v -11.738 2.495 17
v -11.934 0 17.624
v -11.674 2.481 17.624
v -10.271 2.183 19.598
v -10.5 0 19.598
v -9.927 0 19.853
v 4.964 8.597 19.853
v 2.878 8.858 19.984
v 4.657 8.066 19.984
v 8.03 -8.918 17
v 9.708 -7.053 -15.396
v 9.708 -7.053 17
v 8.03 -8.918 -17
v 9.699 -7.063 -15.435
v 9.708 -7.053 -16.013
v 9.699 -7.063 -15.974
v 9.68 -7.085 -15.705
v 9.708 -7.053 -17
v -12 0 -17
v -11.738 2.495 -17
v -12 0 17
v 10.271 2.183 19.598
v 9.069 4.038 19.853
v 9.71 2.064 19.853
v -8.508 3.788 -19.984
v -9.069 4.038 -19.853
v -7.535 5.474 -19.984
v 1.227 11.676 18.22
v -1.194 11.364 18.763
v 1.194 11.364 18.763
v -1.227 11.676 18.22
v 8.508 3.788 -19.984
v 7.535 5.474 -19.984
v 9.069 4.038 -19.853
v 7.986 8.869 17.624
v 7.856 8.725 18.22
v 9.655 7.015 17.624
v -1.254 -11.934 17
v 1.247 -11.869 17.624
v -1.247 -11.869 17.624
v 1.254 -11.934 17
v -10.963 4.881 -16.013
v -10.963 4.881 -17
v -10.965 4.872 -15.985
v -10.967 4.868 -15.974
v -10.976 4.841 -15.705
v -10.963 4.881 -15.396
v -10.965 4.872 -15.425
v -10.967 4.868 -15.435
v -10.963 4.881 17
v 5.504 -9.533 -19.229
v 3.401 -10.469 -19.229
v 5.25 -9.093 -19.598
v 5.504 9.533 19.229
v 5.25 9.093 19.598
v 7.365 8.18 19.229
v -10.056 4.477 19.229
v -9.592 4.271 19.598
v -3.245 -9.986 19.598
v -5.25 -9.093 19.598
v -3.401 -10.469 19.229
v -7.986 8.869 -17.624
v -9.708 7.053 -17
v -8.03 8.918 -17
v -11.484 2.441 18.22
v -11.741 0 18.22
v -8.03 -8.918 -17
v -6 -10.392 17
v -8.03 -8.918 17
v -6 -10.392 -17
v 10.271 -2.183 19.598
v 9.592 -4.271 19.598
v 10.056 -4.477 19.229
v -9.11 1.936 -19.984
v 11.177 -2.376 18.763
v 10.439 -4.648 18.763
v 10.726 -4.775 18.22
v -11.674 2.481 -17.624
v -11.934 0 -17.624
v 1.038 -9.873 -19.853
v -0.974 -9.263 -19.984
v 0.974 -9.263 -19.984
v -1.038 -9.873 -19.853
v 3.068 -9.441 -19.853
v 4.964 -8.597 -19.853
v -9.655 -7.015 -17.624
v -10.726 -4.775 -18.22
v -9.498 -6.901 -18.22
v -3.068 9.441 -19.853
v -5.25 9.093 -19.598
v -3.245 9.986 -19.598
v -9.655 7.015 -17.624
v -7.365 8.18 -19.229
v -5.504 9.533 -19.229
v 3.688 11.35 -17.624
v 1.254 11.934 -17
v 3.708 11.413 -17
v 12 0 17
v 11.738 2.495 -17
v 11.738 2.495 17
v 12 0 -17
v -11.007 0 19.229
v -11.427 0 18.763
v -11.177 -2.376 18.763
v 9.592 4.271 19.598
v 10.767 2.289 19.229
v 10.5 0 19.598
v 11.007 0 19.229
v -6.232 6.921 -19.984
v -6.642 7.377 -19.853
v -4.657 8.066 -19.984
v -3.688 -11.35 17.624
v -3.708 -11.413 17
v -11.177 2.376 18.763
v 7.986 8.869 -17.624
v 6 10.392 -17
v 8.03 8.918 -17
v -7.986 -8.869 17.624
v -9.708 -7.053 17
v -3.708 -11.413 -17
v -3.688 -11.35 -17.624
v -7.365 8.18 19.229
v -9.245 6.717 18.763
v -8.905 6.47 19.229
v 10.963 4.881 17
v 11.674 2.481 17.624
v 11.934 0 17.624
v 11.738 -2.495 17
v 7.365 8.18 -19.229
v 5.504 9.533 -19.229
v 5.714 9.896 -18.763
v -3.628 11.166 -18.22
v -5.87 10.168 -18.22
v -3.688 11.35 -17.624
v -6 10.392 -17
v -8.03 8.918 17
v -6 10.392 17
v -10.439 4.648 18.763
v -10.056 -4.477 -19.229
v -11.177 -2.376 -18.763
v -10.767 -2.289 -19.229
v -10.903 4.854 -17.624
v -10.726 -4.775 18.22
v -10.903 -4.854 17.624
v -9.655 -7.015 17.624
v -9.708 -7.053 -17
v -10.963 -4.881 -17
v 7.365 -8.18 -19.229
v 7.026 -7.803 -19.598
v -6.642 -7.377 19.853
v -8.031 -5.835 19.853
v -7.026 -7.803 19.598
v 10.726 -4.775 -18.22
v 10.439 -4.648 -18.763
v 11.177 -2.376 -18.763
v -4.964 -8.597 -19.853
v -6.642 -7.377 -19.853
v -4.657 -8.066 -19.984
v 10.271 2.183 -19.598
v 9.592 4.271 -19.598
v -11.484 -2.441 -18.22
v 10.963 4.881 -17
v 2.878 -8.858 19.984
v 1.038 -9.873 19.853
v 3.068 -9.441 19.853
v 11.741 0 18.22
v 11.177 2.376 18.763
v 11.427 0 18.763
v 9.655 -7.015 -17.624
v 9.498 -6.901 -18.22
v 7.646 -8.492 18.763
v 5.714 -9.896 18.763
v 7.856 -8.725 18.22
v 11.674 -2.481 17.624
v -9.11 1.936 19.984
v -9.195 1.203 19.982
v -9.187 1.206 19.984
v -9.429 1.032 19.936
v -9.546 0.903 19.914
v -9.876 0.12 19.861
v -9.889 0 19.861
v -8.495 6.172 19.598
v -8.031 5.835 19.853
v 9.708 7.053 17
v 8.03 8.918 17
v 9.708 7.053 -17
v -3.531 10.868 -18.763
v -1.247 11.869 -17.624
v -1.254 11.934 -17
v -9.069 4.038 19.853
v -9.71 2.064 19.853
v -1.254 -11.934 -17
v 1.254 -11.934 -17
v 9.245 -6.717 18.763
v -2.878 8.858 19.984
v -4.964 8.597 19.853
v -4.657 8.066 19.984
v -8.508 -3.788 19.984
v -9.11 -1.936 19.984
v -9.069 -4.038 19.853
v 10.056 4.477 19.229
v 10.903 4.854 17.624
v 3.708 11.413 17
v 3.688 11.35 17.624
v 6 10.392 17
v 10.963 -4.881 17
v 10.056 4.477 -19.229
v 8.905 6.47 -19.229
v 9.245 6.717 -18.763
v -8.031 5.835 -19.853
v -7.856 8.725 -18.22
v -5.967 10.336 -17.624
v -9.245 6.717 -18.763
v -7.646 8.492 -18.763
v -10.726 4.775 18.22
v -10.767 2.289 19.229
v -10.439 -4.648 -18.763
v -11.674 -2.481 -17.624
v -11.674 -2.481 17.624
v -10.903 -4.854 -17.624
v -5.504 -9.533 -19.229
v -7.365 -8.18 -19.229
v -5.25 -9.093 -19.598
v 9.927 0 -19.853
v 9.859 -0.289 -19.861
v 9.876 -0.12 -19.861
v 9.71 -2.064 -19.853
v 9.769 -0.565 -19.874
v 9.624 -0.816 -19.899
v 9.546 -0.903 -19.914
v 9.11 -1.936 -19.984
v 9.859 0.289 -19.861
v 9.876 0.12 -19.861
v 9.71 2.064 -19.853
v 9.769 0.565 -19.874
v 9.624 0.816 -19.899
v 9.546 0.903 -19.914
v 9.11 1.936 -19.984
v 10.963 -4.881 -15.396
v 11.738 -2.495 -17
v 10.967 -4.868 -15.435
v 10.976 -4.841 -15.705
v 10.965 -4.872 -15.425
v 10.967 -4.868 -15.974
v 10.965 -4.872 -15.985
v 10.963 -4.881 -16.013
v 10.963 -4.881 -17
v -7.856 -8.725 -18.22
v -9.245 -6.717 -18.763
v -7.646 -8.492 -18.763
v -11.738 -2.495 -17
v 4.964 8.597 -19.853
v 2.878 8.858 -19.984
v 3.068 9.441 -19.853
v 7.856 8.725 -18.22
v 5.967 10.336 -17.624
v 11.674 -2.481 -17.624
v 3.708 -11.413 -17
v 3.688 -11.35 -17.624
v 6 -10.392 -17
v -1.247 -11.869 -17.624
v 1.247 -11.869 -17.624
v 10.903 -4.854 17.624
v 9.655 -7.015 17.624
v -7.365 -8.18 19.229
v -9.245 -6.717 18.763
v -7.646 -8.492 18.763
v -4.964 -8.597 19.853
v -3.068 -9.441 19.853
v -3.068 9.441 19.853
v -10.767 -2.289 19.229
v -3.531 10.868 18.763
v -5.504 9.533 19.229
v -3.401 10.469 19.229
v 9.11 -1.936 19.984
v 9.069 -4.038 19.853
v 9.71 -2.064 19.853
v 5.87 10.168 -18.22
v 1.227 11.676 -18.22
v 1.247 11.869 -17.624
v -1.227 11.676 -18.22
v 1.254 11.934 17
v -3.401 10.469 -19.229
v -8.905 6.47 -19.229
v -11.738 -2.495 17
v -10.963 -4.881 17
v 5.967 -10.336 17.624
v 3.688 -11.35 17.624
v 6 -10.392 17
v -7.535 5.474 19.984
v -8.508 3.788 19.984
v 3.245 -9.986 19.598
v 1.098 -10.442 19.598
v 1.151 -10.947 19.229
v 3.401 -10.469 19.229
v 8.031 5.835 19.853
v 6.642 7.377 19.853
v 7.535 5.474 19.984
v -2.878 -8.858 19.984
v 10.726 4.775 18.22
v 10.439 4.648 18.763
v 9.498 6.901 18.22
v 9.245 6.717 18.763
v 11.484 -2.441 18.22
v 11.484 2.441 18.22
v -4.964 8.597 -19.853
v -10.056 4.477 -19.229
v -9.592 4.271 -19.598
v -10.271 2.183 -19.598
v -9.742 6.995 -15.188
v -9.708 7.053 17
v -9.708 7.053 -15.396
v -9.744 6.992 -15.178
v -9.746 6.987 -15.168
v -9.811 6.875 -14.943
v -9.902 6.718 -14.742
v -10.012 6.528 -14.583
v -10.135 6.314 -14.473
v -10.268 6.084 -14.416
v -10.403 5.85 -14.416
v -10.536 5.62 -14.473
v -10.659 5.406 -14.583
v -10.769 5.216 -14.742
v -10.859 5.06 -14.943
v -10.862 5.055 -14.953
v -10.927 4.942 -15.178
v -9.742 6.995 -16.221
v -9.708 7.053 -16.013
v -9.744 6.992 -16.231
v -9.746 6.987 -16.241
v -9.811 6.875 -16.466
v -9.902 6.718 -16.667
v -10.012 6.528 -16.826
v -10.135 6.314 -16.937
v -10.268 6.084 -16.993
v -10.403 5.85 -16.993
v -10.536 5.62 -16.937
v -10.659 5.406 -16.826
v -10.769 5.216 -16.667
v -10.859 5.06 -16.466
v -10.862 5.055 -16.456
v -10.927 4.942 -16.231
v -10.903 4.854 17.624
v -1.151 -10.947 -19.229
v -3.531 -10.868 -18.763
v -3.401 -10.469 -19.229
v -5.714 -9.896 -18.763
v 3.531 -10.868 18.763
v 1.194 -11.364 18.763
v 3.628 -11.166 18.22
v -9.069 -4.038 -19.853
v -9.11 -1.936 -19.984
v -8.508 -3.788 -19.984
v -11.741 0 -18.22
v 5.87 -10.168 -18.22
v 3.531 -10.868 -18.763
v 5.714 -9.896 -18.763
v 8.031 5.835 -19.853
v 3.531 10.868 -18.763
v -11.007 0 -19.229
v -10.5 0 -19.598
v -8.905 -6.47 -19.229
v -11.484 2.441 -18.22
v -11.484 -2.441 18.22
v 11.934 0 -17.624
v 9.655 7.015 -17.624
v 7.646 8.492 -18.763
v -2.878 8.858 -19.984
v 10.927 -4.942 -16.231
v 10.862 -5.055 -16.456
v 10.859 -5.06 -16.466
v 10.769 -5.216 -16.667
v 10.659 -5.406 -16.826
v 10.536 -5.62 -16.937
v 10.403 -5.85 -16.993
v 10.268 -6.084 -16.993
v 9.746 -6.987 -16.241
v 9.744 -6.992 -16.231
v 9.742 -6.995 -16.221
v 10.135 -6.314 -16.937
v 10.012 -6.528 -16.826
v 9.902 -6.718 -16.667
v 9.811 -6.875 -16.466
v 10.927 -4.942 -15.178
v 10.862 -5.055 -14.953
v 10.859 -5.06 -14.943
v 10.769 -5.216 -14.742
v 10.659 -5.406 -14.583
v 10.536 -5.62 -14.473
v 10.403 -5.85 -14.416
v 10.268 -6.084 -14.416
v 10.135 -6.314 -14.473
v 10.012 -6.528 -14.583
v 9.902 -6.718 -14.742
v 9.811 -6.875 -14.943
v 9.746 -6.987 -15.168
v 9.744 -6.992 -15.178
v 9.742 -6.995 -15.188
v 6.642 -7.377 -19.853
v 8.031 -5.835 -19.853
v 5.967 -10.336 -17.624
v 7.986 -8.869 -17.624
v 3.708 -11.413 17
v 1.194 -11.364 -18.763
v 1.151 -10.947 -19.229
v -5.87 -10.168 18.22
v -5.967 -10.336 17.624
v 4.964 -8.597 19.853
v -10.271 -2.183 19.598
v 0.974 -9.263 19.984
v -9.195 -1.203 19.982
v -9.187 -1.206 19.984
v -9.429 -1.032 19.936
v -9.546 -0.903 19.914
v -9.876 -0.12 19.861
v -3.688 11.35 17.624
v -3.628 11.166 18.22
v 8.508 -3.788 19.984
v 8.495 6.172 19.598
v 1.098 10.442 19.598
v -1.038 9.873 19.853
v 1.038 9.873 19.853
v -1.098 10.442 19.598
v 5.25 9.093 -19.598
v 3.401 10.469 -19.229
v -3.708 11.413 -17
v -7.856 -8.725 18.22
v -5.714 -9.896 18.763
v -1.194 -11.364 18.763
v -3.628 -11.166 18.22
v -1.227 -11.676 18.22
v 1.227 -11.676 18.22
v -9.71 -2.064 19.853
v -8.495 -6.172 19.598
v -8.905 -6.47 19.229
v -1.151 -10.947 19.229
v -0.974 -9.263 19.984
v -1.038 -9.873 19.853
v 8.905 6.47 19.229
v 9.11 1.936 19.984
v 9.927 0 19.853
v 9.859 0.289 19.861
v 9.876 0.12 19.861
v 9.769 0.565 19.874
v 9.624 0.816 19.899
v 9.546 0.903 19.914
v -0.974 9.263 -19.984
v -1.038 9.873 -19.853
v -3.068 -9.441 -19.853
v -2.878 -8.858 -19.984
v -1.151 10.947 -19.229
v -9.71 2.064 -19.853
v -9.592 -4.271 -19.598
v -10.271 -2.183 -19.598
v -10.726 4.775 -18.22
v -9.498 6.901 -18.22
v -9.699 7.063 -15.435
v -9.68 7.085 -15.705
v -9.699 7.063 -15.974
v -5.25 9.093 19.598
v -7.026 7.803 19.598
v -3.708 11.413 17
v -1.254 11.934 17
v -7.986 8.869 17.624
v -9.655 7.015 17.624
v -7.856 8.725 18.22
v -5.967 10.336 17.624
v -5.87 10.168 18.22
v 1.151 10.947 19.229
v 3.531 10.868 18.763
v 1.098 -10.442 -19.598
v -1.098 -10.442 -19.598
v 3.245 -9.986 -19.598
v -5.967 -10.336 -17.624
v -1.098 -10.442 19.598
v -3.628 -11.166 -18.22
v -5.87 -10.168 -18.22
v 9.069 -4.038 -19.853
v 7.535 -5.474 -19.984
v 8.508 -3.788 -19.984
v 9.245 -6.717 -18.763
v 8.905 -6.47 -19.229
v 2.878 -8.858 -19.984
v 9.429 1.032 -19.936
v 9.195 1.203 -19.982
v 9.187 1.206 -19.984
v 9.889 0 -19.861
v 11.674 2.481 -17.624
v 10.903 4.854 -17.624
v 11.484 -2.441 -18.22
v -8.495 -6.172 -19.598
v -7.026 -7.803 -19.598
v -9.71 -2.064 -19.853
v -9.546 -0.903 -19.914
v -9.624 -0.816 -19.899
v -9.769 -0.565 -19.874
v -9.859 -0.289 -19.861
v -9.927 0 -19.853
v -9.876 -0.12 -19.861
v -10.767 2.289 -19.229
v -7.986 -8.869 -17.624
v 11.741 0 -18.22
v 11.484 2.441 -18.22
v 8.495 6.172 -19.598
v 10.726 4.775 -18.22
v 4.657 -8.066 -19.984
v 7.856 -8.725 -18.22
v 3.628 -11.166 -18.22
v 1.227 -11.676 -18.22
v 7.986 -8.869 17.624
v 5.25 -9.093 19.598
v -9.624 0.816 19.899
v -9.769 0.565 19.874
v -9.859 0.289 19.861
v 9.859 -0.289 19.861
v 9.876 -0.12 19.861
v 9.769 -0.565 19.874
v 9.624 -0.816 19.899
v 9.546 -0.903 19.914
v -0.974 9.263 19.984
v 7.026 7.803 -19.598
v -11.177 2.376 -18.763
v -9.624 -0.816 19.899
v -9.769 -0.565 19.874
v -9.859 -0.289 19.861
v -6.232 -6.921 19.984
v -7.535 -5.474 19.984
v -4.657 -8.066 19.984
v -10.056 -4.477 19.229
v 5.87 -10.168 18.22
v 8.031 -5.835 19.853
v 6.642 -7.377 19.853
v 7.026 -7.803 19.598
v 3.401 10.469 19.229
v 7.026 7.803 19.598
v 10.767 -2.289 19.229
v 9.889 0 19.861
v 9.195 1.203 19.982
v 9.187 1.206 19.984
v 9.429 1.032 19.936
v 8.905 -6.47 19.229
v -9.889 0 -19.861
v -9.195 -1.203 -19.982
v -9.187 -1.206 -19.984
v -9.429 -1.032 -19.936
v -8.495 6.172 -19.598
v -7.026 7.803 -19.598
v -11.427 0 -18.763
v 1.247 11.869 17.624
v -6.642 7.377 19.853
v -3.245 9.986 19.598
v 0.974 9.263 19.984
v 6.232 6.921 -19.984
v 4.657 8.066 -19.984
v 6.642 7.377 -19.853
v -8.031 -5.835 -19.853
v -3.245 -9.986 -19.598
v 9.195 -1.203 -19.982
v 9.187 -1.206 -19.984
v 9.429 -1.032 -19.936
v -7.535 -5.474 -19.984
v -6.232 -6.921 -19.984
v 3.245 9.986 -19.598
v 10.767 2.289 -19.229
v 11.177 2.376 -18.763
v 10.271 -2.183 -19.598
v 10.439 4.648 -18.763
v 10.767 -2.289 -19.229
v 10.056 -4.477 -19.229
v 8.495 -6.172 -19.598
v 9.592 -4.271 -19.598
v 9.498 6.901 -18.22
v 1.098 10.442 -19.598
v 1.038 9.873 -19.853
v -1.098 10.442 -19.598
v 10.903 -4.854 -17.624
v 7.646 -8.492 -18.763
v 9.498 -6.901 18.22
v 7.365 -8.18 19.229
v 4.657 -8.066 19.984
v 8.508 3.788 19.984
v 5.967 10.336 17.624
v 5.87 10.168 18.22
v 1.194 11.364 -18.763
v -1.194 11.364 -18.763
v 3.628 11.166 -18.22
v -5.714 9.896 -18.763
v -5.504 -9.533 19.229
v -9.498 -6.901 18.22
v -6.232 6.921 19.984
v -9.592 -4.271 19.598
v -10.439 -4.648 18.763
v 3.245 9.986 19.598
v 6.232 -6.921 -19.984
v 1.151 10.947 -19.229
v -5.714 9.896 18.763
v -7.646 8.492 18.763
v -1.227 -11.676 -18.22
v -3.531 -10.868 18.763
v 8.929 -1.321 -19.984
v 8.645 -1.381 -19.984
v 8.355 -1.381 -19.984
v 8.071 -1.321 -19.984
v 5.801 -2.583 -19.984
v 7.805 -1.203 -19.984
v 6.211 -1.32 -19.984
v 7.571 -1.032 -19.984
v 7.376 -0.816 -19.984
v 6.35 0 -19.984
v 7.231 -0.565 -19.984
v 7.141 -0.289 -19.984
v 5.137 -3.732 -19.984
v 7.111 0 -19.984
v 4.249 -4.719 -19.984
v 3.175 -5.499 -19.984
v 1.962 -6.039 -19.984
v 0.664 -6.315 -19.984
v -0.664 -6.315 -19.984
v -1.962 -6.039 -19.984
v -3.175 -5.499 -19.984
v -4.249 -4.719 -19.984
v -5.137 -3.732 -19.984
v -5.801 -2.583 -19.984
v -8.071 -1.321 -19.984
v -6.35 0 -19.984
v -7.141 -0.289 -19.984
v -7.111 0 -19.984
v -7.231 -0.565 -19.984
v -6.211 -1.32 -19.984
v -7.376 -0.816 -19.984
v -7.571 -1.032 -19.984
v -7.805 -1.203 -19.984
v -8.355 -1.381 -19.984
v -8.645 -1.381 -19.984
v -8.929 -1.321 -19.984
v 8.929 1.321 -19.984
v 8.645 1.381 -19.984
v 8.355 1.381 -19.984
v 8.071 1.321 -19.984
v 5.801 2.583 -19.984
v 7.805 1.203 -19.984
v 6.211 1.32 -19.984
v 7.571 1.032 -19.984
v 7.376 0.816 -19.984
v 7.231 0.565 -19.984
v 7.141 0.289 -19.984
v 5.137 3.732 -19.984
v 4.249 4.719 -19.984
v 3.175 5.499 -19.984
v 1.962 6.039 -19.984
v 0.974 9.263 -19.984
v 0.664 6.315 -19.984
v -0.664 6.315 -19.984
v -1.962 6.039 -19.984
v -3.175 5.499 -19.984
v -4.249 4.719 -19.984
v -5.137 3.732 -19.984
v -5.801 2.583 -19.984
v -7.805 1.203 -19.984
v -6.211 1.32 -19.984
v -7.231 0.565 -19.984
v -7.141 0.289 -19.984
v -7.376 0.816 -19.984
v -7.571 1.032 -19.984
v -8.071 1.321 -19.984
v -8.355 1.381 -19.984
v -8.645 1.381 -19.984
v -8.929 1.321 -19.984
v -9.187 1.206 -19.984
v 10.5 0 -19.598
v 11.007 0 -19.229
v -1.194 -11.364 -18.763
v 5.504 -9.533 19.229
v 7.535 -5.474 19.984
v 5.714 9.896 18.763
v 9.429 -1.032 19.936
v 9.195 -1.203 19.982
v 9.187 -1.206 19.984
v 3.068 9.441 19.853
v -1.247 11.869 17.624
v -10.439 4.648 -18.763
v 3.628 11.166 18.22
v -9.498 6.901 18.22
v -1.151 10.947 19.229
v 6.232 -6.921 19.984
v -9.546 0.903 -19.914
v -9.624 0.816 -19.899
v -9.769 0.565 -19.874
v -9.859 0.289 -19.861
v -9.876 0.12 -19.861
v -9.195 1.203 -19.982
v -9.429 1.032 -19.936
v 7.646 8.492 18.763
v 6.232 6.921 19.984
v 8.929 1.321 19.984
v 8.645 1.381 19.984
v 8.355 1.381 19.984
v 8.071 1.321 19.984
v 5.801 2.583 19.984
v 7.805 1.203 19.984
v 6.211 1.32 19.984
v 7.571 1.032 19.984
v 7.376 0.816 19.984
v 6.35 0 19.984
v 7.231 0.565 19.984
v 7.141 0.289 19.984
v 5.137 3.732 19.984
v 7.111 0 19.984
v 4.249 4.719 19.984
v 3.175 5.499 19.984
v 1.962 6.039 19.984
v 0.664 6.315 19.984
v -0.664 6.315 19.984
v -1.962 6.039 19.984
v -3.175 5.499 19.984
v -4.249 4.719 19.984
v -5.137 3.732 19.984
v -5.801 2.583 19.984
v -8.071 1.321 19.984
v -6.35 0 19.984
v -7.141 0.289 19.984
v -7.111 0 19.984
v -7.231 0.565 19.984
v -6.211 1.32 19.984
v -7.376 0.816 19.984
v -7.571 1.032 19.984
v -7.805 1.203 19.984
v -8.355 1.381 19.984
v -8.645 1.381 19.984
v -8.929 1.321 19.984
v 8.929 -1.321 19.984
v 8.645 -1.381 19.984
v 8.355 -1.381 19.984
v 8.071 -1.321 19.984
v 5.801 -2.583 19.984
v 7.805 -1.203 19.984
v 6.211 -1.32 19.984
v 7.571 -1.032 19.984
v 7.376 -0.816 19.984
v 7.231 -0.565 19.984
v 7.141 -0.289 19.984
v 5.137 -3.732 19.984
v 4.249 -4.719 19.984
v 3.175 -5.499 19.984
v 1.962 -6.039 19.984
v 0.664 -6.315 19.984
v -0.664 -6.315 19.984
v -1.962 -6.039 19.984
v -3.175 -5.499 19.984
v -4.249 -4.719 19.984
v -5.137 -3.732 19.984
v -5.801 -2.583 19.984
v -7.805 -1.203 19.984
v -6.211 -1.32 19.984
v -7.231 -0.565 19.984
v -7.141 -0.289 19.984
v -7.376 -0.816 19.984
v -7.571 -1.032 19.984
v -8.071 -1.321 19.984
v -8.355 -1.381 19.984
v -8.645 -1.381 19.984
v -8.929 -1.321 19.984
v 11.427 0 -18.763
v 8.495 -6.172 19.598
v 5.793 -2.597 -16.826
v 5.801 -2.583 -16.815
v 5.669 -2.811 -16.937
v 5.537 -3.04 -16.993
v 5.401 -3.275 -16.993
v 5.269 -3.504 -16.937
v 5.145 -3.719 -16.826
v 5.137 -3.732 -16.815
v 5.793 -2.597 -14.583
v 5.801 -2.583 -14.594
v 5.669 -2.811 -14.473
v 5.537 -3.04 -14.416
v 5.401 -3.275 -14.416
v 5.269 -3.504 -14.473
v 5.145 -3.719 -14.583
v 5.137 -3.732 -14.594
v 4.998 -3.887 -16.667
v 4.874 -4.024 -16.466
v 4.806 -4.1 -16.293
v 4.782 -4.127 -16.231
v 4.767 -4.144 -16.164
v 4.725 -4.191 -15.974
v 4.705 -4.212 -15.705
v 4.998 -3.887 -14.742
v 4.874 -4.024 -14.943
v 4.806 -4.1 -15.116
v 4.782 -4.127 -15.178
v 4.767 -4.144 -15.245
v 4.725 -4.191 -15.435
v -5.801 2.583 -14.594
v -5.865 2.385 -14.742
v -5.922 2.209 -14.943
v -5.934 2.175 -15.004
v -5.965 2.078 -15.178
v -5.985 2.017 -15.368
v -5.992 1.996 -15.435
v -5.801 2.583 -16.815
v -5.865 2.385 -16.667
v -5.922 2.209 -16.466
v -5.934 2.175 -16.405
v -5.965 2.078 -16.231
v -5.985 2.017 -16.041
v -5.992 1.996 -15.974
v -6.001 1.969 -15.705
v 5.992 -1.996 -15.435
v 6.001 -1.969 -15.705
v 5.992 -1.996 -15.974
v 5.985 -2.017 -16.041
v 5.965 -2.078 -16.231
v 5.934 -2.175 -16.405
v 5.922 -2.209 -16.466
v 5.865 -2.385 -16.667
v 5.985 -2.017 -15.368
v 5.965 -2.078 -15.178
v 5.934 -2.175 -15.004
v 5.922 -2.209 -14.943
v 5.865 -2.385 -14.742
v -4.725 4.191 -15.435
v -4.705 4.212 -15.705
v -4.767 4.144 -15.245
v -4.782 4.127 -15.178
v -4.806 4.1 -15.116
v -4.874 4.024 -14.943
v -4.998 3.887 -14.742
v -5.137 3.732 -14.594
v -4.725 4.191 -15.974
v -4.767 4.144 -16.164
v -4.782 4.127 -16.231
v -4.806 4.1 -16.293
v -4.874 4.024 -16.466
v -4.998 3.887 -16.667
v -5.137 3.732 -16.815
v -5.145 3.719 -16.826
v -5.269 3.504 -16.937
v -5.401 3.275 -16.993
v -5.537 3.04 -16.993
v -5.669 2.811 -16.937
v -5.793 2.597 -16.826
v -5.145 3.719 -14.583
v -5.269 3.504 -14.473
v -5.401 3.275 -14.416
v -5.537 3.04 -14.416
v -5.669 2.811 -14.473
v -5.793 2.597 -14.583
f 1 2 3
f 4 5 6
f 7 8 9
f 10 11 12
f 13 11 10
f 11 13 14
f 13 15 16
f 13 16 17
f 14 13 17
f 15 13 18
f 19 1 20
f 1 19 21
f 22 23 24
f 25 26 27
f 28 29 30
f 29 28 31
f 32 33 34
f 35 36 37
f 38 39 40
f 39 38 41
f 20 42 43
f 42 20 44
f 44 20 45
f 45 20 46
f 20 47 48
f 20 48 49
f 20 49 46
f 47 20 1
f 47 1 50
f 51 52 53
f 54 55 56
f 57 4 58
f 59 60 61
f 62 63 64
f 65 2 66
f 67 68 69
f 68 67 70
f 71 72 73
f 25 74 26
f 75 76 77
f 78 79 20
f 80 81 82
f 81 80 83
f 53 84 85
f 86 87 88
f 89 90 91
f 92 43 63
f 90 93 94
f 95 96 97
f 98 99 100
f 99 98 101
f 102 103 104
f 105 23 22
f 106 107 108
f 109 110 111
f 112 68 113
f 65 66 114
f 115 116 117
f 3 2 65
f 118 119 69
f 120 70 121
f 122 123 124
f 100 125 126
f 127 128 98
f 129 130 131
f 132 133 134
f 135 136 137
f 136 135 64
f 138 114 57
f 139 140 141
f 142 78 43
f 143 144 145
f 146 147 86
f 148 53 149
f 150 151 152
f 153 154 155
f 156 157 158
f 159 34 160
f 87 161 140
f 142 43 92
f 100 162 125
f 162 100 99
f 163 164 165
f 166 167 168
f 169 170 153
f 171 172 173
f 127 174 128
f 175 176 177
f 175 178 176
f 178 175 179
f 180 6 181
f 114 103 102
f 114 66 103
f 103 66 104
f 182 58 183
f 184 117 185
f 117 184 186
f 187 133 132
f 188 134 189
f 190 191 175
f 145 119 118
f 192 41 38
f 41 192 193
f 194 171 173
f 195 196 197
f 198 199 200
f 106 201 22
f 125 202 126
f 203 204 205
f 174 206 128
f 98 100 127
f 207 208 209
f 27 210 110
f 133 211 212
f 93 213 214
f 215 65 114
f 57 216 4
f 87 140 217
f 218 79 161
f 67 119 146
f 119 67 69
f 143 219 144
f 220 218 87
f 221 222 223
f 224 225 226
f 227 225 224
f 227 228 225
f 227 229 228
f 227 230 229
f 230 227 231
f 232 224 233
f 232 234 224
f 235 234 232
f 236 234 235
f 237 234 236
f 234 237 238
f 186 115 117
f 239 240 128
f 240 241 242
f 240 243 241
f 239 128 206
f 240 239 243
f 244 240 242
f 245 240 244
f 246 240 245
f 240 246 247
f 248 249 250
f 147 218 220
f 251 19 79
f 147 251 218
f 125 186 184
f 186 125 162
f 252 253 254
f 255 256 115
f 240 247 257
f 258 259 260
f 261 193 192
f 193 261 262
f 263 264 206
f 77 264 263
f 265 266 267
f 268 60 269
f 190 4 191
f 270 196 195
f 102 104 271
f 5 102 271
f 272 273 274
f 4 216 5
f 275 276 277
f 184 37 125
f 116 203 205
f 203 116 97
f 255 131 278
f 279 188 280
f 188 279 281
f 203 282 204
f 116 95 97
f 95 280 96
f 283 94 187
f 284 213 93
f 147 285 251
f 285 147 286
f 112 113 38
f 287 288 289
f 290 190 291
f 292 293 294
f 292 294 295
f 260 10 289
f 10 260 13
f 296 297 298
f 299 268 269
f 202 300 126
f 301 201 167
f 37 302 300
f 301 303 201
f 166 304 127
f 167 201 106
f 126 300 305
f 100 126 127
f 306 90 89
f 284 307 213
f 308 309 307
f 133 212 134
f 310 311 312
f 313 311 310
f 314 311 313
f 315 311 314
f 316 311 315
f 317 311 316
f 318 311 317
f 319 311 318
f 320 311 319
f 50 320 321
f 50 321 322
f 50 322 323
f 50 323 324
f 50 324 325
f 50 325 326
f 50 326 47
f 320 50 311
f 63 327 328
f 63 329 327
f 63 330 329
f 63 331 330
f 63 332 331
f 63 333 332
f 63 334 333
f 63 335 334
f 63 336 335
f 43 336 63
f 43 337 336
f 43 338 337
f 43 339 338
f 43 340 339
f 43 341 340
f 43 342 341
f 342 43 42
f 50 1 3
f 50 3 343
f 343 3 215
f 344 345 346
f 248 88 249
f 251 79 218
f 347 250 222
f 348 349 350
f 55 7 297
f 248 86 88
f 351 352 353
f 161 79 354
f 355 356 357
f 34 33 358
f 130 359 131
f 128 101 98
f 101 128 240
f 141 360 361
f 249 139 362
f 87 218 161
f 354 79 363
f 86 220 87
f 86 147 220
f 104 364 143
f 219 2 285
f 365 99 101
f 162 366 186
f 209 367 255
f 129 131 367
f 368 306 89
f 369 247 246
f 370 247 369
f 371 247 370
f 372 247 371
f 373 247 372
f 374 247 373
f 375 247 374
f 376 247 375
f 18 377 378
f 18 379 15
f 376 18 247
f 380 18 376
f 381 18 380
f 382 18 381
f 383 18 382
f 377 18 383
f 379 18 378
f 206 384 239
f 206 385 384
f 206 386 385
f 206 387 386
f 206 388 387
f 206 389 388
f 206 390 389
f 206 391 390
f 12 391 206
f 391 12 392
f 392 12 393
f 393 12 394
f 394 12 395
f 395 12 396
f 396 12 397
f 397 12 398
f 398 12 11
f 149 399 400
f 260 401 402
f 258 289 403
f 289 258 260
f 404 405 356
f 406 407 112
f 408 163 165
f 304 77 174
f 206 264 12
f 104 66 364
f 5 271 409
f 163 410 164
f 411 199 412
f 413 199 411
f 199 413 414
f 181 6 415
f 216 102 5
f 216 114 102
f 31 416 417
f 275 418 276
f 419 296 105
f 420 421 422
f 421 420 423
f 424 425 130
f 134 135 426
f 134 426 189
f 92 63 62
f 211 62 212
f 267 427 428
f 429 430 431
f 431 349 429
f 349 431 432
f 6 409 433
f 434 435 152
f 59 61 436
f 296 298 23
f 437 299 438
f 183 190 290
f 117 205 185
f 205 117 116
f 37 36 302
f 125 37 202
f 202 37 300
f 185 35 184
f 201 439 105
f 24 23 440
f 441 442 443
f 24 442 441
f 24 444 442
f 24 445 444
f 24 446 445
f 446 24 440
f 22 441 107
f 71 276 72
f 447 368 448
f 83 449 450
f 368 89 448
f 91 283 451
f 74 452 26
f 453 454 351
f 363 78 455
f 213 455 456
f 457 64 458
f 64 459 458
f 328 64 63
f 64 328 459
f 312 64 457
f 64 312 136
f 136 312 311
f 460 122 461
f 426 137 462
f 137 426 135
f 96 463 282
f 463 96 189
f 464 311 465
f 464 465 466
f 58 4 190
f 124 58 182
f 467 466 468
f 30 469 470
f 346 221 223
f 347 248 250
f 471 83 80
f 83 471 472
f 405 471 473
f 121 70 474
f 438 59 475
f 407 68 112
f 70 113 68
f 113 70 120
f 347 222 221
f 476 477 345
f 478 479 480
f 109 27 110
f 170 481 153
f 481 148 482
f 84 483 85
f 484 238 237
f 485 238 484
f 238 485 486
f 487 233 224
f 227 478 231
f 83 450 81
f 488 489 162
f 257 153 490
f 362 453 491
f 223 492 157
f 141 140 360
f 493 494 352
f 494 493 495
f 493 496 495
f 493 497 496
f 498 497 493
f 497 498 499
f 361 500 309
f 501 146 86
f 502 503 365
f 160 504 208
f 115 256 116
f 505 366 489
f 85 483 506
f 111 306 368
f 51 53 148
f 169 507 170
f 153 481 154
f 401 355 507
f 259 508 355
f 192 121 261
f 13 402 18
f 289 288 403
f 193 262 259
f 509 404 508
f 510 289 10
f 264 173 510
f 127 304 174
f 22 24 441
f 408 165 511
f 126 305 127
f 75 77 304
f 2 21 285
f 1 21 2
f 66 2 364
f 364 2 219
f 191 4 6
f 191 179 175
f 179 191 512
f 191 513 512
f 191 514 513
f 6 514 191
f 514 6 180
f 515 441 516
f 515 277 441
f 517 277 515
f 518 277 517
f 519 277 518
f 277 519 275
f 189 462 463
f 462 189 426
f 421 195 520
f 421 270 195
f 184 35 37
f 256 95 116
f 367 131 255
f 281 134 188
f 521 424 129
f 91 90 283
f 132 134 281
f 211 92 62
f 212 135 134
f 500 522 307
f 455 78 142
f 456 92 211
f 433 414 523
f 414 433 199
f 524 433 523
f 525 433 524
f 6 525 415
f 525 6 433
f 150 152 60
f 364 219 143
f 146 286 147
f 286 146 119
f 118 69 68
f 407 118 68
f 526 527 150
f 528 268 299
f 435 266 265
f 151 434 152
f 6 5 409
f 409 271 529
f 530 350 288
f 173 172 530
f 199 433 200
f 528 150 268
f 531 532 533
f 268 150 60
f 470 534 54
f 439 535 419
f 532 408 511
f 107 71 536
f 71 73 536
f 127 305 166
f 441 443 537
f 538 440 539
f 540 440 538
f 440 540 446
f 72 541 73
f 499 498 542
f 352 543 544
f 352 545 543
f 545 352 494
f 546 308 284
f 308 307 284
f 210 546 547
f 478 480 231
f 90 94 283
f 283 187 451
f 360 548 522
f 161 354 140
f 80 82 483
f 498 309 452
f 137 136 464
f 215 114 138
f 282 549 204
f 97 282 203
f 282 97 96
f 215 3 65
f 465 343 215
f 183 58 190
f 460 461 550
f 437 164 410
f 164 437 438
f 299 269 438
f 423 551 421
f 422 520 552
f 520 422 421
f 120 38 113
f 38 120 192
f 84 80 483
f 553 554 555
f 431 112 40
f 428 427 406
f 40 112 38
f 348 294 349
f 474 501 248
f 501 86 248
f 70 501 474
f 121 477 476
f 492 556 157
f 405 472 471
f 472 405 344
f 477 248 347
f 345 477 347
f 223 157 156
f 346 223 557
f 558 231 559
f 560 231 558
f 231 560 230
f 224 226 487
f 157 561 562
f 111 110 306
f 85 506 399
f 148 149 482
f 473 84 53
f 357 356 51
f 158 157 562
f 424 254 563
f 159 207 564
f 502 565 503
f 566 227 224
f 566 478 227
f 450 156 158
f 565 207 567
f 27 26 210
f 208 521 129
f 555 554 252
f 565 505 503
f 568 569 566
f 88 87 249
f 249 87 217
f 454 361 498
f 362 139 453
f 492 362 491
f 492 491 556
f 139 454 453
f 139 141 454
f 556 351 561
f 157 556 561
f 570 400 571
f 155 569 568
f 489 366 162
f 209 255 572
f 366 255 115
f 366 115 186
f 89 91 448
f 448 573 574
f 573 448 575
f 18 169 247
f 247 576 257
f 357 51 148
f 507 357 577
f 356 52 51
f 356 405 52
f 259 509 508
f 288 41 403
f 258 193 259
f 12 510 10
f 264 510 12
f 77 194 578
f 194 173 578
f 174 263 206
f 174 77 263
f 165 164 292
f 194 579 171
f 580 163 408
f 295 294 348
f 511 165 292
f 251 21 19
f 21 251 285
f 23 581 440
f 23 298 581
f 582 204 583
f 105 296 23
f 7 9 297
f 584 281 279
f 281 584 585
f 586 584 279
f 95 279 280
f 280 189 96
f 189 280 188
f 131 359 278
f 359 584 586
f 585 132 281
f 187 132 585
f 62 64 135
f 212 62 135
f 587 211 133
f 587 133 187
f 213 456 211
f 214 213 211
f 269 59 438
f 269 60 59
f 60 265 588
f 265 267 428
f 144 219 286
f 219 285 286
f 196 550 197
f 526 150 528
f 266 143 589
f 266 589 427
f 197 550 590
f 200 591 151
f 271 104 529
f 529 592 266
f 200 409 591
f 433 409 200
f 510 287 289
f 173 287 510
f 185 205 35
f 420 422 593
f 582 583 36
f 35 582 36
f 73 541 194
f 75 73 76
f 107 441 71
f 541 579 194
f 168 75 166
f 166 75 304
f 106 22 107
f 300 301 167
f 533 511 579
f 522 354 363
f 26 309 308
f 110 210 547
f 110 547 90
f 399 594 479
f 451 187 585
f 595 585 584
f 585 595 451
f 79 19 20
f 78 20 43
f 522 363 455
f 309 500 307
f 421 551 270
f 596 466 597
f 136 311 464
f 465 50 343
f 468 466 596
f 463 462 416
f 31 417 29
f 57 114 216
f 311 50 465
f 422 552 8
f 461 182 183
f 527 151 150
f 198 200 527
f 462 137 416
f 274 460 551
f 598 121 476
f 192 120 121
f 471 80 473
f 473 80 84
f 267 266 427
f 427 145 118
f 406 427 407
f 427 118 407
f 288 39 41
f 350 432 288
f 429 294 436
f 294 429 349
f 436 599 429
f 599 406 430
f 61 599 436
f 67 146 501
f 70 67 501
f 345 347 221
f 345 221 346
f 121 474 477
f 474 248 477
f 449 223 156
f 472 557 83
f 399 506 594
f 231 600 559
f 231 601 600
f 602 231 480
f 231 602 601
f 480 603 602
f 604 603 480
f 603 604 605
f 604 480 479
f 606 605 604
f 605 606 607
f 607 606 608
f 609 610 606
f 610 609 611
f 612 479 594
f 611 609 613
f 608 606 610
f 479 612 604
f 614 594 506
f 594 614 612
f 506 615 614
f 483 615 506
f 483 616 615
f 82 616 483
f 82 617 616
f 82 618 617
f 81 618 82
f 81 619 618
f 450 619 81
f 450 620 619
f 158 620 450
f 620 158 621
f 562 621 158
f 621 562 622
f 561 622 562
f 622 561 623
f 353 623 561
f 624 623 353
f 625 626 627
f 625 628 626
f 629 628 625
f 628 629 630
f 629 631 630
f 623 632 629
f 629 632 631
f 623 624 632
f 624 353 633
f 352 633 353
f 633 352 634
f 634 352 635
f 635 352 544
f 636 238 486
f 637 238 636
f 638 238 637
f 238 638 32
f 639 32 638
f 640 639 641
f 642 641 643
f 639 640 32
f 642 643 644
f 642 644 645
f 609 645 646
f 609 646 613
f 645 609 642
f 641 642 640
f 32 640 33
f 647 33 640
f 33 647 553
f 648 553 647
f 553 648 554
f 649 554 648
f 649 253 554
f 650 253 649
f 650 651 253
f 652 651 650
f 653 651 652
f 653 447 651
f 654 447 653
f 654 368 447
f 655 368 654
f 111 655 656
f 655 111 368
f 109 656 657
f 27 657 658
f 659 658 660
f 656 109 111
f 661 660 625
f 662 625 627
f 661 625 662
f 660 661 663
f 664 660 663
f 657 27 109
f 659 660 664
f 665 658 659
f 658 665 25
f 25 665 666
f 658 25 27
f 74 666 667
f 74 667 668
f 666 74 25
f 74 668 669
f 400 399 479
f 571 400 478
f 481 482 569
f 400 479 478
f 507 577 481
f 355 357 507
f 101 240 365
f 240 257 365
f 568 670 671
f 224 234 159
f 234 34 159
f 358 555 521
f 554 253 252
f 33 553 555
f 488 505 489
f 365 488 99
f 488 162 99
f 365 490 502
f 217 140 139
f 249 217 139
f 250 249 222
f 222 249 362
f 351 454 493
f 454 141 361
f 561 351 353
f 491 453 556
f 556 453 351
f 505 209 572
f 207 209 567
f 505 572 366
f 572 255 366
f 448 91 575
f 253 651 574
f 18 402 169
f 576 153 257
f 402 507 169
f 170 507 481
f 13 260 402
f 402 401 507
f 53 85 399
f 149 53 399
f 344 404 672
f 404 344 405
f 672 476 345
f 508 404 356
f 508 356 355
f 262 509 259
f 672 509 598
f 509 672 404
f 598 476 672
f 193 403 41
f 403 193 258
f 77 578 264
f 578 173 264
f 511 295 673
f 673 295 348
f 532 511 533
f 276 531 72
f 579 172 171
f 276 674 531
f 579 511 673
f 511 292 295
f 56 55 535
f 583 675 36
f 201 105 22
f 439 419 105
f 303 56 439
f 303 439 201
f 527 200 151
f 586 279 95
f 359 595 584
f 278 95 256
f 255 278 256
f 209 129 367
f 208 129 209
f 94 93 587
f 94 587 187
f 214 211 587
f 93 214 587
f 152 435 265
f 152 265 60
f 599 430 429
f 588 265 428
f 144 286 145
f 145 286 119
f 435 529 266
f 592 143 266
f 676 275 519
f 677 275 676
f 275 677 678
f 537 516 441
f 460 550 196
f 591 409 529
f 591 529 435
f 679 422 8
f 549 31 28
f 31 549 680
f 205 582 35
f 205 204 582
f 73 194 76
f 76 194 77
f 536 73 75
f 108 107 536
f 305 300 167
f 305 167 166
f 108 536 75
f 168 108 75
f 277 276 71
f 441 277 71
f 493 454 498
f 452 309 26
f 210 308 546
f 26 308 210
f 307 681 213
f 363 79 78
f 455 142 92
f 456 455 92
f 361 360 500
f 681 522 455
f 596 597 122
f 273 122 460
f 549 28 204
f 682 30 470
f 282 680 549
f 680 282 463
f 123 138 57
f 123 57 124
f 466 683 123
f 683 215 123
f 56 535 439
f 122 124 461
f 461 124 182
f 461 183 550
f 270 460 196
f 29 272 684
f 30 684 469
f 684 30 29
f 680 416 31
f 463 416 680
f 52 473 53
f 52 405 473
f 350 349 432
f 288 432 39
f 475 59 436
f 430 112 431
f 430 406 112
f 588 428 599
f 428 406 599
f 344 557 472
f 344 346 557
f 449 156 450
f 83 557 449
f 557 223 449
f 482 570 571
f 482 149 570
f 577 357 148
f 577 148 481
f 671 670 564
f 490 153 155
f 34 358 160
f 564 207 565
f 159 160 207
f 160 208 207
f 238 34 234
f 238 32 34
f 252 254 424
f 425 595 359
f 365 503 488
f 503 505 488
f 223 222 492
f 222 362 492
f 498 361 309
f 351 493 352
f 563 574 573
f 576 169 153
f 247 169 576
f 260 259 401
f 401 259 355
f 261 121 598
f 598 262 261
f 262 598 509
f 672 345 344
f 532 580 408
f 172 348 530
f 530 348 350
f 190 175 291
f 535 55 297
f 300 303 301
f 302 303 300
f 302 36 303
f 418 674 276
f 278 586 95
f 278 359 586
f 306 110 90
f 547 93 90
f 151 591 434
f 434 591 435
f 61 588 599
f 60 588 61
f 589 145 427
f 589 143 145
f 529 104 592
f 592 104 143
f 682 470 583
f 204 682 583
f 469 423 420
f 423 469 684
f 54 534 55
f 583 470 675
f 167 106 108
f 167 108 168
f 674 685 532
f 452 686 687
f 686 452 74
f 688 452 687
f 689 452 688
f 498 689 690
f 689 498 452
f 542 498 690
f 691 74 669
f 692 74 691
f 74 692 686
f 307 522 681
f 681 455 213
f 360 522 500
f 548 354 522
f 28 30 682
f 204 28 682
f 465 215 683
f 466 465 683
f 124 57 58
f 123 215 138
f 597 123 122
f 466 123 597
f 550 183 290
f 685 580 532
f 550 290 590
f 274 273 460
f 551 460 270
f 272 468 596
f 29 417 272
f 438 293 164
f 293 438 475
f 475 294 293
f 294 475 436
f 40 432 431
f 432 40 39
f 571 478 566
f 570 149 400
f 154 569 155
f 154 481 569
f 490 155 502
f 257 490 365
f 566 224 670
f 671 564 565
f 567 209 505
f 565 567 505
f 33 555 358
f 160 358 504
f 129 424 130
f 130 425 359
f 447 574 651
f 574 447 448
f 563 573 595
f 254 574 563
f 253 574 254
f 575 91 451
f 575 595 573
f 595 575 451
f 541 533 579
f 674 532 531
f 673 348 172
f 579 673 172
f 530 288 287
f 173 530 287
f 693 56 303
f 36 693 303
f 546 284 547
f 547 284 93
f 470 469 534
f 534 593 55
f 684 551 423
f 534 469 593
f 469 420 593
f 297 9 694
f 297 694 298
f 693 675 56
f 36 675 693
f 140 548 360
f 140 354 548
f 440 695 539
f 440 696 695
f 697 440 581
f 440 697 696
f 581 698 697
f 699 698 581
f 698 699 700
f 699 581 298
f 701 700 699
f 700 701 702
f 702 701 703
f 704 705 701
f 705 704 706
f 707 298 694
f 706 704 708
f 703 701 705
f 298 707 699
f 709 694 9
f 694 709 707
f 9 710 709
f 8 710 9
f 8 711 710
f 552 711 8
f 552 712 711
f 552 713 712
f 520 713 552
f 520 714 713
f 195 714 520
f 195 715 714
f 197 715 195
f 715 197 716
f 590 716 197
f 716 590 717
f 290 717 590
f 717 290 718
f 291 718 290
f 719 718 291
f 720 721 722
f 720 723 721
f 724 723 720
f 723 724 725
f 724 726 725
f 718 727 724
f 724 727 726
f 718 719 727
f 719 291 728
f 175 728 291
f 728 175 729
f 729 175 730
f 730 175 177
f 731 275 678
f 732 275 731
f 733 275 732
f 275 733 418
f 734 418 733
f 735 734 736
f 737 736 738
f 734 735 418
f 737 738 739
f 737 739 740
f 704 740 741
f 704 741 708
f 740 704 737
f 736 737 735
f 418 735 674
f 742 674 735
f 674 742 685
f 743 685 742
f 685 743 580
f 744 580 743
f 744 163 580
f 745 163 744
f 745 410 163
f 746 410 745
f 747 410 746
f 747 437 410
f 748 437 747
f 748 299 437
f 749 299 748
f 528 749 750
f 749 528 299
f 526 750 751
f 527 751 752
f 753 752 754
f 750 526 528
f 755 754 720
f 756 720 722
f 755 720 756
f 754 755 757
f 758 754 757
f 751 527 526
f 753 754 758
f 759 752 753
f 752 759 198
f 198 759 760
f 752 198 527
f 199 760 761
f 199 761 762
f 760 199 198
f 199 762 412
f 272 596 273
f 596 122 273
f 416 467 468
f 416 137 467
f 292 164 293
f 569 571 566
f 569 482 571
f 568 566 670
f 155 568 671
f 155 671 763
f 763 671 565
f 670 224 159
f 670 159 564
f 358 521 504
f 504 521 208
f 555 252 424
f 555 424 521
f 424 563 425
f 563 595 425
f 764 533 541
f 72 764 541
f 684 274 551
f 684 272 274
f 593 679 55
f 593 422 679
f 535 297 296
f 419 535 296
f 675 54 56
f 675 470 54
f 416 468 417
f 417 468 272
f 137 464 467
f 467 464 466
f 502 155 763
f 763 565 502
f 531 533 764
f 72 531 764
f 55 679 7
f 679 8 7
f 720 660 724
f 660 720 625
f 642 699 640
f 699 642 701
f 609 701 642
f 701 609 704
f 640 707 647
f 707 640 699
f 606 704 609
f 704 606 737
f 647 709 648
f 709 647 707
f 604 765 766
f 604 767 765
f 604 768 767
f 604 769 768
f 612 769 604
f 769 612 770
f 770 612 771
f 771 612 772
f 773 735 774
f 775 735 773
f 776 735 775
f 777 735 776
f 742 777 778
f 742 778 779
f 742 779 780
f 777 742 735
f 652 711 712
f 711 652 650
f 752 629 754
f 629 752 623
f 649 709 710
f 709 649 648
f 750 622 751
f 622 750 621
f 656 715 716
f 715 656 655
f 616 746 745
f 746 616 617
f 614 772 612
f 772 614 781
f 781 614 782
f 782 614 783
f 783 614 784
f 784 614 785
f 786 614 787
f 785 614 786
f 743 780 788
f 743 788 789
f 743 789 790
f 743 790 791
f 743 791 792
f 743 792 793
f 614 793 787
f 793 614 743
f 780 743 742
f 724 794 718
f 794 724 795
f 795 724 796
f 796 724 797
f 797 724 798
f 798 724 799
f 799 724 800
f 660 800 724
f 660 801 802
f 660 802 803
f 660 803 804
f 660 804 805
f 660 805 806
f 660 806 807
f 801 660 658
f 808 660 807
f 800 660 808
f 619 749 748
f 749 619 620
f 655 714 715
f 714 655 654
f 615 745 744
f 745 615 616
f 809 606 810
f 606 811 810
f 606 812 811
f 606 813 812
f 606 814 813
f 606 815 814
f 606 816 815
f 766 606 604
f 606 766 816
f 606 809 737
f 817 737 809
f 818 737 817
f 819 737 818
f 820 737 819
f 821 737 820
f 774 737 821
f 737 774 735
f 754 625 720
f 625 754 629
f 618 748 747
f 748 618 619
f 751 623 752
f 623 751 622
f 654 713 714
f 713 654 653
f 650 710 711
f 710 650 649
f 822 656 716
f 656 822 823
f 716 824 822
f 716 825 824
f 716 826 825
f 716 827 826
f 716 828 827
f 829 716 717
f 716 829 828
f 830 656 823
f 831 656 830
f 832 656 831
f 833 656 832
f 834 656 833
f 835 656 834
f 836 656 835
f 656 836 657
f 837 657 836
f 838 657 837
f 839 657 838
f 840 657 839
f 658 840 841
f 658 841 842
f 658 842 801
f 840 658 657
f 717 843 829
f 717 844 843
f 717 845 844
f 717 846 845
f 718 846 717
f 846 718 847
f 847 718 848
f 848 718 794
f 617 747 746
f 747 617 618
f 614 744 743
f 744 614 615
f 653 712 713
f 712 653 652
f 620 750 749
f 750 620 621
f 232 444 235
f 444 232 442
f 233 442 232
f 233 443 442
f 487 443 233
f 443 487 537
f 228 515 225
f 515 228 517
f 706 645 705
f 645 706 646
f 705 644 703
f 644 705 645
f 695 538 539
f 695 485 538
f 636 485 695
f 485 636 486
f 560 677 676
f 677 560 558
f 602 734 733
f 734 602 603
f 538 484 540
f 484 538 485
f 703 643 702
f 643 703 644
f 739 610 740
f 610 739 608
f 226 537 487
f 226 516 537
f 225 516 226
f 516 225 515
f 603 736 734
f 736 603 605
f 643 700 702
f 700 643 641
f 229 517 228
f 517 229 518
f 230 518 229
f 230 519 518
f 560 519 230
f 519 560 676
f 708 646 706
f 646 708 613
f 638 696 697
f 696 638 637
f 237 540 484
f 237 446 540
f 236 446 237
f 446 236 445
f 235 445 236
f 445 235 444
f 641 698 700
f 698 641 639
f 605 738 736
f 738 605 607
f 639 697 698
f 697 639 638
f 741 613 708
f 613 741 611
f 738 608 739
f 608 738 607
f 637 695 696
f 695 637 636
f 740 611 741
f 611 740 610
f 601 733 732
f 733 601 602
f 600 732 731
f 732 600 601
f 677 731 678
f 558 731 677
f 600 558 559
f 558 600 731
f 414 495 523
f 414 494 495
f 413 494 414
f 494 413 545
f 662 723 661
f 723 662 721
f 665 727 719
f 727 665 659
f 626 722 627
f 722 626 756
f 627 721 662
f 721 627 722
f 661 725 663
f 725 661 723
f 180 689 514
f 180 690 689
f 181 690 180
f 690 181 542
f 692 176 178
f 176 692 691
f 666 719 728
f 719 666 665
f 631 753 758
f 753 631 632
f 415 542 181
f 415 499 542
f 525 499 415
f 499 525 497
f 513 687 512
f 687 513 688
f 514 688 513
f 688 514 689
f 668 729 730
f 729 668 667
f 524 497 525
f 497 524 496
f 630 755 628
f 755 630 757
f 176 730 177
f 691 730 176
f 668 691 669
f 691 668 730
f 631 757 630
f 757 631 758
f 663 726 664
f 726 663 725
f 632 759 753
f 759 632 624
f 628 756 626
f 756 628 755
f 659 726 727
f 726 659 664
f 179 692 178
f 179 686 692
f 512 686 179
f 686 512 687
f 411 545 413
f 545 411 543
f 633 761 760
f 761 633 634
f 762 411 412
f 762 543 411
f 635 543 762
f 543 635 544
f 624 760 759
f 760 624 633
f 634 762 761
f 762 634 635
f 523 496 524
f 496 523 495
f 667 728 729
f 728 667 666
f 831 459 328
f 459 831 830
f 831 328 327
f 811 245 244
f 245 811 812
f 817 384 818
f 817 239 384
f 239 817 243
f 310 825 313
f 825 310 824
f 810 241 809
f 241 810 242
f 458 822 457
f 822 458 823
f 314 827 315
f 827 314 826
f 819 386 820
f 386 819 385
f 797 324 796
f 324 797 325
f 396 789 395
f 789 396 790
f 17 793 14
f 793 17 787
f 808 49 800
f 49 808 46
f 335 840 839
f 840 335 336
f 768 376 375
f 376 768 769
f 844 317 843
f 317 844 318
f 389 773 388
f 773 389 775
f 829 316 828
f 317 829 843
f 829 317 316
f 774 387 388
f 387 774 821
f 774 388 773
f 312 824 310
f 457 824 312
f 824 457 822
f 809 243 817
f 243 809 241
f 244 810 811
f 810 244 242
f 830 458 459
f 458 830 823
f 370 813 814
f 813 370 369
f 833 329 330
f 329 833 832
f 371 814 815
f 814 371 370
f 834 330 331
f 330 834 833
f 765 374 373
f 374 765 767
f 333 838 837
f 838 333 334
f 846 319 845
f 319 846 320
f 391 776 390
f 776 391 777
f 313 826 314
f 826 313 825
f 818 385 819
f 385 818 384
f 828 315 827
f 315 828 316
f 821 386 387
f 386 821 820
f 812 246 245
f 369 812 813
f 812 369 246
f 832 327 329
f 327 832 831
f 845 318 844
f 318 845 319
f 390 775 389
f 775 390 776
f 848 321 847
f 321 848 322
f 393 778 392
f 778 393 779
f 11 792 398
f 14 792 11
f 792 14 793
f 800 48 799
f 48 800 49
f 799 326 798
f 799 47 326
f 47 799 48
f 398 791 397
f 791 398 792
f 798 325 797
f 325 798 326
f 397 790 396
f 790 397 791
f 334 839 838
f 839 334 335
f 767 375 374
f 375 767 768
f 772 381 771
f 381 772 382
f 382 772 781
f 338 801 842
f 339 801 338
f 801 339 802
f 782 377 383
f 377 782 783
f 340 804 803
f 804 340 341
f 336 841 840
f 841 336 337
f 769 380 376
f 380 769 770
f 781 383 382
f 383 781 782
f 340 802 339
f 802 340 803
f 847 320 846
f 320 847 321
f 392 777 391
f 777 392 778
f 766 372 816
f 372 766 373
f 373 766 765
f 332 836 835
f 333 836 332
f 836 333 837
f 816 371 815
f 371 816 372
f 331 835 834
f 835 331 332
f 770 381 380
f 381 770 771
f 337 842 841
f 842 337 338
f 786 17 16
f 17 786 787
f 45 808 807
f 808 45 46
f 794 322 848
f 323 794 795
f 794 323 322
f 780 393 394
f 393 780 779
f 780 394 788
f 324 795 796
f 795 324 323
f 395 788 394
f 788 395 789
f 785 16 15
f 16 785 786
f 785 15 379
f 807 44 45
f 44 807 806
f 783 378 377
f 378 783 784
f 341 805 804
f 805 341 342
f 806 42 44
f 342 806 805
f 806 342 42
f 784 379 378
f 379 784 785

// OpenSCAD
// file: rounded_cylinder.scad
// Modules for generating a rounded cylinder, rounded disc, and torus
// Author: Philip B Chase, <philipbchase@gmail.com>

/* License: To the extent possible under law, Philip B Chase has waived all copyright and related or neighboring rights to modules to generate a rounded cylinder, rounded disc, and torus. This work is published from: United States.  See: http://creativecommons.org/publicdomain/zero/1.0/

Usage:

    $fn=30;
    height=10;
    major_radius=7;
    minor_radius=3;

    rounded_cylinder(height, major_radius, minor_radius);

      or

    rounded_disc(major_radius, minor_radius);

*/


module rounded_cylinder(height, major_radius, minor_radius) {
    // height is the total height of the cylinder
    // major_radius is the radius of the flat zone at the top and bottom of the cylinder
    // minor_radius is the radius of curvature of the rounded edges
    // the radius of the cylinder is major_radius + minor_radius
    // the cylinder is centered at [0,0,0]
    torus_displacement = 0.5 * height - minor_radius;
    hull(){
        translate([0,0,torus_displacement])
            torus(major_radius, minor_radius);
        translate([0,0,-torus_displacement])
            torus(major_radius, minor_radius);
    }
}

module rounded_cylinder_2(height, cylinder_major_radius, torus_minor_radius) {
    // height is the total height of the cylinder
    // cylinder_major_radius is the overall radius of the cylinder--not the torus
    // minor_radius is the radius of curvature of the rounded edges
    // the cylinder is centered at [0,0,0]
    torus_displacement = 0.5 * height - torus_minor_radius;
    torus_major_radius = cylinder_major_radius - torus_minor_radius;
    hull(){
        translate([0,0,torus_displacement])
            torus(torus_major_radius, torus_minor_radius);
        translate([0,0,-torus_displacement])
            torus(torus_major_radius, torus_minor_radius);
    }
}

module rounded_disc(major_radius, minor_radius) {
    // the disc is centered at [0,0,0]
    hull() {
        torus(major_radius, minor_radius);
    }
}

module torus(major_radius, minor_radius){
    // minor_radius is the radius of the cross section of the torus
    // major_radius is the radius torus
    //$fn=30;
    rotate_extrude(convexity = 10)
        translate([major_radius,0,0])
            circle(minor_radius);
}
// main file
// 3D model for a chickenloop release for a kite-bar control system
// The chickenloop release is the thing you push away to release the kite from your harness.
// Make one per kite bar
// Author: Philip B Chase, <philipbchase@gmail.com>
/* This component functions as the release for the chickenloop and a below-the-bar handle for the kite. It must be comfortable when gripping a timmed-out kite. It must slide freely on a doubled trimline of 4mm Amsteel Blue. The Amsteel passes through the large center bore. A stainless steel pin of about 1/8" diameter, crosses and divides the center bore to provide a retainer for the trimline. In addition to the trimline and the retaining pin, the center bore must be large enough to accommodate a 40mm cotter pin used to retain the free end of the chickenloop. The side bores retain a segment of 1/8" bungie that pushes the chickenloop release down onto the cotter pin. These bores must be long enough to allow enough bungie to stretch 40mm so the chickenloop release can easily be pulled off the cotter pin to release it.

    This component should be printed with 100% infill.

*/
/* License: To the extent possible under law, Philip B Chase has waived all copyright and related or neighboring rights to 3D model for a chickenloop release for a kite-bar control system. This work is published from: United States.  See: http://creativecommons.org/publicdomain/zero/1.0/
*/

use <rounded_cylinder.scad>;

$fn=30;

// Body dimensions
overall_width=24;  // x
overall_depth=overall_width;  // y
overall_height=40; // z
// radii of block corners and edges
r_body = 3;

// Dimensions of central bore
// Drill out to 3/16"
central_bore_radius = 0.5 * 25.4 / 2;
central_bore_length = overall_height + 2;

// Dimensions of bungie bore
bungie_bore_radius = 7/64 * 25.4 / 2; 
bungie_bore_length = overall_height + 2;
bungie_bore_x_offset = 8.5;

// Dimensions of retaining pin bore
// See https://www.mcmaster.com/89085K87
pin_bore_radius = 0.102 * 25.4 / 2; 
pin_bore_length = overall_depth + 2;
pin_bore_z_offset = overall_height / 2 - r_body - pin_bore_radius;


difference() {
    cylindrical_body(overall_width, overall_depth, overall_height, r_body);
    central_bore(central_bore_radius, central_bore_length);
    flying_line_bore(bungie_bore_radius, bungie_bore_length, bungie_bore_x_offset);
    flying_line_bore(bungie_bore_radius, bungie_bore_length, -bungie_bore_x_offset);
    pin_bore(pin_bore_radius, pin_bore_length, -pin_bore_z_offset);
}


module central_bore(radius, length) {
    cylinder(h=length, r=radius, center=true);
}

module flying_line_bore(radius, length, x_offset) {
    translate([x_offset,0,0])
        cylinder(h=length, r=radius, center=true);
}

module pin_bore(radius, length, z_offset) {
    translate([0,0,z_offset])
        rotate([90,0,60])
            cylinder(h=length, r=radius, center=true);
}

module cylindrical_body(overall_width, overall_depth, overall_height, radius_of_edges) {
    major_radius = overall_width/2;
    y_scale = overall_depth/overall_width;
    scale([1,y_scale,1]) {
        rounded_cylinder_2(overall_height, major_radius, radius_of_edges);
    }
}
